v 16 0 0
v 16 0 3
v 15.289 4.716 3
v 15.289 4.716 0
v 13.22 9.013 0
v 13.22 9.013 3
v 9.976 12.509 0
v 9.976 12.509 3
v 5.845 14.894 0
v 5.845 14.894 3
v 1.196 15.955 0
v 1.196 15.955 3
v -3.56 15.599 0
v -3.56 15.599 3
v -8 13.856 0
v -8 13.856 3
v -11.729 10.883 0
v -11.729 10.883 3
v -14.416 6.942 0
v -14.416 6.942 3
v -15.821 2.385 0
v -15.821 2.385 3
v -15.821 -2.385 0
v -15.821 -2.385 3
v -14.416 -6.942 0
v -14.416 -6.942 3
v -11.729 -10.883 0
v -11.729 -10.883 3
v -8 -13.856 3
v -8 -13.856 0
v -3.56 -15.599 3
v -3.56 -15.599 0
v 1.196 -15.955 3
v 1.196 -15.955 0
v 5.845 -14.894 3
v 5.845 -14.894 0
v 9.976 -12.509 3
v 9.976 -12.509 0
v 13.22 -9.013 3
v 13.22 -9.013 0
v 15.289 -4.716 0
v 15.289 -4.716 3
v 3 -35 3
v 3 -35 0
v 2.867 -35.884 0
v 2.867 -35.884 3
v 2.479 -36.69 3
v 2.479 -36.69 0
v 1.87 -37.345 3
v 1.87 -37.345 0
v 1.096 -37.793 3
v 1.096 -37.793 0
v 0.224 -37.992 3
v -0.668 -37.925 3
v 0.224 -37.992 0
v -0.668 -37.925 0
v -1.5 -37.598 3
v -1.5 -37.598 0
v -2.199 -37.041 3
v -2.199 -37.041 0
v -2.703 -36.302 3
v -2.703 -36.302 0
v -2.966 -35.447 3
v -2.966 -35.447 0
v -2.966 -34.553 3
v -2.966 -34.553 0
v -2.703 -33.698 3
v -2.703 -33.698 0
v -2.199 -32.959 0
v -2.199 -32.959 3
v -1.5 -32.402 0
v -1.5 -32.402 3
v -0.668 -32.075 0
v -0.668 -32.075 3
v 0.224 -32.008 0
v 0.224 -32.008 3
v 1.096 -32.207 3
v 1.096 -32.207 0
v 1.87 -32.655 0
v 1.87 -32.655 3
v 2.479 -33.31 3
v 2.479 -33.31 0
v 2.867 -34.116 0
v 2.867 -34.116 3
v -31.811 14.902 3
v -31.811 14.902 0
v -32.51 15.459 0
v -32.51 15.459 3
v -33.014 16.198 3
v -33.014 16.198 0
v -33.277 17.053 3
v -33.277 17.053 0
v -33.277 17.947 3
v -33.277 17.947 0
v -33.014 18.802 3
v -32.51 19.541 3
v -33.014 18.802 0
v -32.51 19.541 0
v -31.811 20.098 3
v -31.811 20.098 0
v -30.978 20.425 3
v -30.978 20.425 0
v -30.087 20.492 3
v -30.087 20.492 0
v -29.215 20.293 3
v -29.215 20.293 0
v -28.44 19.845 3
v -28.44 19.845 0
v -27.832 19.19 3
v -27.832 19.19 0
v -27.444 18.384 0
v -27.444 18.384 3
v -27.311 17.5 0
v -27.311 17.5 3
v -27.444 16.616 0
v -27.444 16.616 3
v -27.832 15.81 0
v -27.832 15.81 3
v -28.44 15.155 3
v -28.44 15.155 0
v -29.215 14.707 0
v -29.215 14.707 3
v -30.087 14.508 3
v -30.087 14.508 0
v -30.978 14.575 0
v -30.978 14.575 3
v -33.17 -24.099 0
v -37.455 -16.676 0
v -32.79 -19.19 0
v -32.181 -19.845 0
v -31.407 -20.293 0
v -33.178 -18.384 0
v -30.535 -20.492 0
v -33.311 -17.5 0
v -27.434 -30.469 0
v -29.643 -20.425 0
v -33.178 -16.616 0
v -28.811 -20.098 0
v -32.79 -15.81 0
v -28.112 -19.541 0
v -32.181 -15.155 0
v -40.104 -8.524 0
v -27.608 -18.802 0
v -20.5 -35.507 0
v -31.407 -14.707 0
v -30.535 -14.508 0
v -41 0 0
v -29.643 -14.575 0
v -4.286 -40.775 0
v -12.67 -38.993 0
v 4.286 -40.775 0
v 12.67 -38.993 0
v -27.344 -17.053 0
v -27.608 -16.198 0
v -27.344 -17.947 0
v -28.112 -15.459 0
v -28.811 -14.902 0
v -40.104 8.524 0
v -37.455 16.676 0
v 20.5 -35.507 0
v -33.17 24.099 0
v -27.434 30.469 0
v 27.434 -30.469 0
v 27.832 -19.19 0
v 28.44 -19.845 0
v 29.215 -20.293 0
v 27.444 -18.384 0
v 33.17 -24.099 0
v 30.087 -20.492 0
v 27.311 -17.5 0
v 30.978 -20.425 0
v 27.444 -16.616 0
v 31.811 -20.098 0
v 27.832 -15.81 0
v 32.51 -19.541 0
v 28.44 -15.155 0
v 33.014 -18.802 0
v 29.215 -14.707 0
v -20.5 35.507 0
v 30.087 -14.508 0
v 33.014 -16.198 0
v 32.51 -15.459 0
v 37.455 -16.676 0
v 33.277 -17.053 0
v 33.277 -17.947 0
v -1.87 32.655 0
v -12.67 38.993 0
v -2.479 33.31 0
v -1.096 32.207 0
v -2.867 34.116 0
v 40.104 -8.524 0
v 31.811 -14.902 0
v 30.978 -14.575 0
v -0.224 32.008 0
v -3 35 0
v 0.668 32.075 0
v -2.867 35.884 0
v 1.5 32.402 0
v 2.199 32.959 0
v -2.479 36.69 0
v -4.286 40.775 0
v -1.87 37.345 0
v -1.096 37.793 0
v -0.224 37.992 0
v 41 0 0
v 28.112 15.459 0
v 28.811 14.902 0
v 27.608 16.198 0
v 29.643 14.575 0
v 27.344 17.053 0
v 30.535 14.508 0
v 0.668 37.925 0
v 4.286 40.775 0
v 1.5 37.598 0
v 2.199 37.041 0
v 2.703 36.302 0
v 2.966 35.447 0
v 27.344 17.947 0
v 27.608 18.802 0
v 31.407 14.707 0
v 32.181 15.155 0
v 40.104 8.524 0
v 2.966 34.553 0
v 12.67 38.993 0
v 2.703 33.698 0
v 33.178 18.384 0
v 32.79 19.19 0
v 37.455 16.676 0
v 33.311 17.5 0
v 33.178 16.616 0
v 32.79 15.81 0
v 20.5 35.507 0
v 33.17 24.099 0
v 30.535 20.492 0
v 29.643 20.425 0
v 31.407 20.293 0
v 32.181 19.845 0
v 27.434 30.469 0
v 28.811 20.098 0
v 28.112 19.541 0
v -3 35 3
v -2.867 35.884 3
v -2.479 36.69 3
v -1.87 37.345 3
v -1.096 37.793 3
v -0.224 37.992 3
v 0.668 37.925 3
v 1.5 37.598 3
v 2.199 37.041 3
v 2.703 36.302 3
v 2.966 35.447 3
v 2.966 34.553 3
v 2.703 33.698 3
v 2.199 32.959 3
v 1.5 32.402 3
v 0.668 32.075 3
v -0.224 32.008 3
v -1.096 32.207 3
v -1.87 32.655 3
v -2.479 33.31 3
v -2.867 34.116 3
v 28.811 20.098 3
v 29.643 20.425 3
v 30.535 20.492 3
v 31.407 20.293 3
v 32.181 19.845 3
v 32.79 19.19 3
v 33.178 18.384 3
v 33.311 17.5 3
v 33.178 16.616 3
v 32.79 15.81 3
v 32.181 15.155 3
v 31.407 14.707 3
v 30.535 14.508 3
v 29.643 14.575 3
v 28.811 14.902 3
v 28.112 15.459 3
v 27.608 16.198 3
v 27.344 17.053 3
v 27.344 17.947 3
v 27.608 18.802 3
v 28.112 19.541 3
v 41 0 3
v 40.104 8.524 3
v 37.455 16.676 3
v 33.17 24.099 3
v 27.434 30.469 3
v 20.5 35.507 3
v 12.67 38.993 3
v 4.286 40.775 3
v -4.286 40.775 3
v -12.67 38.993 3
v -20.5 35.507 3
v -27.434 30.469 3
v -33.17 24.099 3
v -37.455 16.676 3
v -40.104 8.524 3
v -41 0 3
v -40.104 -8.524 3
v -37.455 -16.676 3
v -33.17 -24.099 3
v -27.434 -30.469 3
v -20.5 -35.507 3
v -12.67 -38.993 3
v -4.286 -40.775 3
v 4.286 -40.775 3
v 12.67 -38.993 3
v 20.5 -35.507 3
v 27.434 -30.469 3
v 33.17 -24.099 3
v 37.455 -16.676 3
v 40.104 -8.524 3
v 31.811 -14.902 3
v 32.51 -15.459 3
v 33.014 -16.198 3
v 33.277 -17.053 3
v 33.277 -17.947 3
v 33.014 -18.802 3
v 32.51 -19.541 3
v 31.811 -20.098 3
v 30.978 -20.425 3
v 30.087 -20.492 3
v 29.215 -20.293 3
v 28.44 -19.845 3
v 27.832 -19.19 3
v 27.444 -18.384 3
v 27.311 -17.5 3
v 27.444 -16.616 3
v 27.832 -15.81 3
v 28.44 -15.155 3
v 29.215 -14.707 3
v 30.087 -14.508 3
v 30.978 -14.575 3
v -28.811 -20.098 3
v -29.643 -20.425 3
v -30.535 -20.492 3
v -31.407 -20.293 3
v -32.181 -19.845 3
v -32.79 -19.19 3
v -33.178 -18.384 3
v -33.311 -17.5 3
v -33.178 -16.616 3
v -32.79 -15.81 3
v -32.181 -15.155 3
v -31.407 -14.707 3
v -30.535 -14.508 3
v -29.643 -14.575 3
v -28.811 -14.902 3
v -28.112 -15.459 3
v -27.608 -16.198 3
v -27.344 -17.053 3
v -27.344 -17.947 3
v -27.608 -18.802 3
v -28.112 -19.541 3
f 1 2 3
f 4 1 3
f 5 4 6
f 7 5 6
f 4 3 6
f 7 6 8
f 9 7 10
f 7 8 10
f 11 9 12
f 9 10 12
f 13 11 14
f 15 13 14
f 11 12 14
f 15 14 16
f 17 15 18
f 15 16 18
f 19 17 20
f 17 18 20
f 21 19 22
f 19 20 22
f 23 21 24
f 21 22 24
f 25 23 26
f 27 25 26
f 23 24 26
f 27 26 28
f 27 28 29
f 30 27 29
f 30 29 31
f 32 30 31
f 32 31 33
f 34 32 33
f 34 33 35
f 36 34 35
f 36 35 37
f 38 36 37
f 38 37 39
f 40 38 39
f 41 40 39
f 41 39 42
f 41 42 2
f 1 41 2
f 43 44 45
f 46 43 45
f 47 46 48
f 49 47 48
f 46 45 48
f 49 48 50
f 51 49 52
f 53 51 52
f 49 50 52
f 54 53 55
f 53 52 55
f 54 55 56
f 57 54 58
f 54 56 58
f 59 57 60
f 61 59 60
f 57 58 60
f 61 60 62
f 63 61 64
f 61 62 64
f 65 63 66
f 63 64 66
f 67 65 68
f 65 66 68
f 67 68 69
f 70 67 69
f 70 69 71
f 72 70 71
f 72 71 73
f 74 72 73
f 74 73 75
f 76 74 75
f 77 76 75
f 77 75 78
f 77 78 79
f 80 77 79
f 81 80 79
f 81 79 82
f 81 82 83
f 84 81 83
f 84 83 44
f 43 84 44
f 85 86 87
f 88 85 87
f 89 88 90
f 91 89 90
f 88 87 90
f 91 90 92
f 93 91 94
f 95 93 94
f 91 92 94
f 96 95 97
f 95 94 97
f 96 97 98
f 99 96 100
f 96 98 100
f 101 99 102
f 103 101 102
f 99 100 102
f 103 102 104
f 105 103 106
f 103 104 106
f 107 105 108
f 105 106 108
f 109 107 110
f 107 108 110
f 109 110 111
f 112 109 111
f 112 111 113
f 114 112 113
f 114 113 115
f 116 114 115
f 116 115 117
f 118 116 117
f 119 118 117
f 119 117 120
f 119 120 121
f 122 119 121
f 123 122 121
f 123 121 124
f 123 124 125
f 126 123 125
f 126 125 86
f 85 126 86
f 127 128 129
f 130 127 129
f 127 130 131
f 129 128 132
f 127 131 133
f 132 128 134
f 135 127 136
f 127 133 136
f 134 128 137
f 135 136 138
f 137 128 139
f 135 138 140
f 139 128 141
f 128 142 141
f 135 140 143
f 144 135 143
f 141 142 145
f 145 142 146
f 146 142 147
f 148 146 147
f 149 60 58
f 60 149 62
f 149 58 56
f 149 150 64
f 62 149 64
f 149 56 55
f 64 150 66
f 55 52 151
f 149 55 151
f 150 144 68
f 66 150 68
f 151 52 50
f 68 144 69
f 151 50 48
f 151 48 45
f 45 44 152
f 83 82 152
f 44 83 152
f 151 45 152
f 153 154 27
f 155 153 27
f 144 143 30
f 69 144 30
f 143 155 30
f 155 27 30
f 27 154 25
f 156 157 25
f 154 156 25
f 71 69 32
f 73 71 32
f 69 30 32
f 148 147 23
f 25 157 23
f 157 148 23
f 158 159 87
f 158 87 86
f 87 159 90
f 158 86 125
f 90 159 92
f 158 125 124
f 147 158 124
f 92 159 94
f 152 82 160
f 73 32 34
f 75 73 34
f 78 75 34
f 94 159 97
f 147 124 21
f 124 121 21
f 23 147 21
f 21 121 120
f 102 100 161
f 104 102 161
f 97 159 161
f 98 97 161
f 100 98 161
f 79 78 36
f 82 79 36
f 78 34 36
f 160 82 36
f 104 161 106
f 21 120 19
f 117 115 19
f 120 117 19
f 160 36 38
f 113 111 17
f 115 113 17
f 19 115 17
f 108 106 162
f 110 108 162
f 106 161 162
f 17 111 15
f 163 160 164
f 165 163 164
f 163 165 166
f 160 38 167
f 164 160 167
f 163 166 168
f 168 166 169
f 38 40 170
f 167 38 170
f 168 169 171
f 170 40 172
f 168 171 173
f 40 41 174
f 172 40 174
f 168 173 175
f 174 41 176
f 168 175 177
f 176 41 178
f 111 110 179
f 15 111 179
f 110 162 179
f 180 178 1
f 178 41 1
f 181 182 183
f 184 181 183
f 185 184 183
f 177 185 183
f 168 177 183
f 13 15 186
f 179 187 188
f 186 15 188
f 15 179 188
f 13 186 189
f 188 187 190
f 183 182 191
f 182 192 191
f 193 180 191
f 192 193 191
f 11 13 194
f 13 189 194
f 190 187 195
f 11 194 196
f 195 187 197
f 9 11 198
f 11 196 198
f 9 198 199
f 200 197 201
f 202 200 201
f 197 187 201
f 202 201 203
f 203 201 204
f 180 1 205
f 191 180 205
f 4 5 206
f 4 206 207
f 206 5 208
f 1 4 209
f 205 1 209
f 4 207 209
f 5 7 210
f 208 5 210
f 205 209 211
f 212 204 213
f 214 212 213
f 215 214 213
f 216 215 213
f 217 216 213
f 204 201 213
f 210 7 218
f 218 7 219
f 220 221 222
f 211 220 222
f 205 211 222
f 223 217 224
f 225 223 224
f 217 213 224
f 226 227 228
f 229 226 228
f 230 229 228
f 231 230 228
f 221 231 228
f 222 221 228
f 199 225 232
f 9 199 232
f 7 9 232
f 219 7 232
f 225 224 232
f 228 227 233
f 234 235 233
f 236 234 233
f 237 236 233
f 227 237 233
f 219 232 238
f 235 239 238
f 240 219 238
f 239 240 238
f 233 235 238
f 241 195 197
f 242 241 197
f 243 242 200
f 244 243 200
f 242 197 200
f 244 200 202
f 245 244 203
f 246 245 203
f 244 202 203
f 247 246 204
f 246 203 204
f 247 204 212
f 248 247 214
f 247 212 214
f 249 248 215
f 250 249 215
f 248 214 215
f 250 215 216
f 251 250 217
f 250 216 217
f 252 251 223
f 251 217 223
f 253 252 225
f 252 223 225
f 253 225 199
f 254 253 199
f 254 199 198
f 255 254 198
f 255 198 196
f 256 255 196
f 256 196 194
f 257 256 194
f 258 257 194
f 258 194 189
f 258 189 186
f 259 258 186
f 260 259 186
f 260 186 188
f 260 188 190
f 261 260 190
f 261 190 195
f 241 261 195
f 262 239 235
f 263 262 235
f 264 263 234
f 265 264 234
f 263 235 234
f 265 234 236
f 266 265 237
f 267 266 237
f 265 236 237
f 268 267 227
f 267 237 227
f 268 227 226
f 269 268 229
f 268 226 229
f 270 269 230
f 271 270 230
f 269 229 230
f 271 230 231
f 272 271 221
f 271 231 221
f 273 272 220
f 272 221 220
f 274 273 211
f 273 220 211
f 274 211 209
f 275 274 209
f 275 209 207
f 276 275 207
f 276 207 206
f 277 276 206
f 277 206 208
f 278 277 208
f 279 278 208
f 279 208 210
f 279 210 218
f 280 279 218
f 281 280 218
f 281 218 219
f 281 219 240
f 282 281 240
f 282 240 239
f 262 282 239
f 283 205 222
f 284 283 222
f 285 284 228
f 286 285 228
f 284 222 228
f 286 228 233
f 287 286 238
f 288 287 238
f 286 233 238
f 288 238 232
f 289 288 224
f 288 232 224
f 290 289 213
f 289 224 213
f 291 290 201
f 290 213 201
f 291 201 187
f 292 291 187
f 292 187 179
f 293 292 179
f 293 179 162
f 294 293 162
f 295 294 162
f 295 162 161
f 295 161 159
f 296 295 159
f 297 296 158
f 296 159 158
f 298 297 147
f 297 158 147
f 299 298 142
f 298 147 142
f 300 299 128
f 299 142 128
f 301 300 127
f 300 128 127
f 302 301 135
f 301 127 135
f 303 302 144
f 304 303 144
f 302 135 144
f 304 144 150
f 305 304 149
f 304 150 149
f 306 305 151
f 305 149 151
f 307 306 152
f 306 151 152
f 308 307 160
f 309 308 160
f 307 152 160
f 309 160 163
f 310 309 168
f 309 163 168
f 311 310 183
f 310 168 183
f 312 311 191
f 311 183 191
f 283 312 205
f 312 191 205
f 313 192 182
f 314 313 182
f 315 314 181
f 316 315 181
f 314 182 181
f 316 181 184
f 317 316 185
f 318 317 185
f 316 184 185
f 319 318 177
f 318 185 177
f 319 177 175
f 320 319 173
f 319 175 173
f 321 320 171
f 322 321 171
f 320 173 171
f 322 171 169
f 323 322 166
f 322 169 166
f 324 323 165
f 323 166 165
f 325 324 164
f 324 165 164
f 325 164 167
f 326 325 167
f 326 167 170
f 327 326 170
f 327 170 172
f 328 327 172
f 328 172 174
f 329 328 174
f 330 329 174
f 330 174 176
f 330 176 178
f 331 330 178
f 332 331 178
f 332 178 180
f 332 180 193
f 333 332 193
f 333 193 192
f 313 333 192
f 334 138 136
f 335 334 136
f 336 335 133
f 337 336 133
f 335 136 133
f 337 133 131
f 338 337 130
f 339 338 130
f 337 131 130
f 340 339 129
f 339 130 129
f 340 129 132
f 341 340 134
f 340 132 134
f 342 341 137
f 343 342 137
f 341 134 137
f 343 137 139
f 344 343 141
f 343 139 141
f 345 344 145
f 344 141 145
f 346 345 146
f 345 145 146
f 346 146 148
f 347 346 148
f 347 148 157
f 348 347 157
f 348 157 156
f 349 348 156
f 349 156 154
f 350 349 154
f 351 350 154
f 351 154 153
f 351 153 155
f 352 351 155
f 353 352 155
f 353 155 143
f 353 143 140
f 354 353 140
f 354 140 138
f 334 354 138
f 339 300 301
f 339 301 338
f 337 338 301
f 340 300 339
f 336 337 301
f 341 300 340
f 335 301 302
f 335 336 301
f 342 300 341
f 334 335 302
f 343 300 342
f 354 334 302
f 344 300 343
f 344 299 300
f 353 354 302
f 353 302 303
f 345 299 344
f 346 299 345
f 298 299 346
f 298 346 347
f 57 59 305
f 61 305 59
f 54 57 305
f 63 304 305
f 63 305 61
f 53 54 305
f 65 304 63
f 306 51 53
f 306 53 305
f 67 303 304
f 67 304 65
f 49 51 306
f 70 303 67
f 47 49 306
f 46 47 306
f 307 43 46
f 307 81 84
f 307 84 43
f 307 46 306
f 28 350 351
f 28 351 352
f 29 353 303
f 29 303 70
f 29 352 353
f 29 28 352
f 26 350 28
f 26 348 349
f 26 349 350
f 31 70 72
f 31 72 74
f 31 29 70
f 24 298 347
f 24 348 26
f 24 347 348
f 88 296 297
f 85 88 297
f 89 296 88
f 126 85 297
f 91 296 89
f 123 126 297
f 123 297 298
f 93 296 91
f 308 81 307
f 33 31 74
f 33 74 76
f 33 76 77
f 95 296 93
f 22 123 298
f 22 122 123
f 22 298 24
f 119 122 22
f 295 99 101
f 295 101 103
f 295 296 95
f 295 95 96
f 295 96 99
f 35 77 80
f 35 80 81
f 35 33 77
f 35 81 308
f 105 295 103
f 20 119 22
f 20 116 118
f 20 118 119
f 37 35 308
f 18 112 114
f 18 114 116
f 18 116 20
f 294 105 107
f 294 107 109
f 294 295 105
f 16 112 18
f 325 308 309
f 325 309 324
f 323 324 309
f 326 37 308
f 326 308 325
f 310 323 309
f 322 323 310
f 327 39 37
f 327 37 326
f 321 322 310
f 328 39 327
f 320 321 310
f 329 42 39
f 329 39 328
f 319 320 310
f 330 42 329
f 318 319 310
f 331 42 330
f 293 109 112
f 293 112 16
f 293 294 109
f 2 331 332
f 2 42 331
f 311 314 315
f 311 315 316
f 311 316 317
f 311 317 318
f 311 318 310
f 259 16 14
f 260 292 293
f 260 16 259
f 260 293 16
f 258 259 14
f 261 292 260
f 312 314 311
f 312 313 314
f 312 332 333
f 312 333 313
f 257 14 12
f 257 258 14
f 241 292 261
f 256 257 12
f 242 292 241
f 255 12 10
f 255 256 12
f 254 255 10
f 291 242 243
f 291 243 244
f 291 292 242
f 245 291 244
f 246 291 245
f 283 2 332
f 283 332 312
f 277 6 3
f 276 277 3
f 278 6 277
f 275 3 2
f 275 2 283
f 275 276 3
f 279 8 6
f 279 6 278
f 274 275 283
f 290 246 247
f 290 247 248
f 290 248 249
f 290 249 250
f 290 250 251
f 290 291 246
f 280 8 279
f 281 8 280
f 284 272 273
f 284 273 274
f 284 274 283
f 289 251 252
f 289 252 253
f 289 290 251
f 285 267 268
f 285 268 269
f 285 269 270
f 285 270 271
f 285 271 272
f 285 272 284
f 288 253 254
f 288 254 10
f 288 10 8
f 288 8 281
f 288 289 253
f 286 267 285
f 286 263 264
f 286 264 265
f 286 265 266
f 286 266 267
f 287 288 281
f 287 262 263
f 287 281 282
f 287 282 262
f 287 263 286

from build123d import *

# Parameters (mm, degrees)
SKETCH1_R           = 41
BOSS_EXTRUDE1_DEPTH = 3
SKETCH3_R           = 3
CUT_EXTRUDE1_DEPTH  = 4
CIRPATTERN1_COUNT   = 6
CUT_EXTRUDE2_REACH  = 5
SKETCH4_R           = 16


with BuildPart() as part:
    # Sketch1 → Boss-Extrude1 (new body)
    with BuildSketch(Plane.XY):
        Circle(SKETCH1_R)
    extrude(amount=BOSS_EXTRUDE1_DEPTH)

    # Sketch3 → Cut-Extrude1 (cut, through all)
    with BuildSketch(Plane(origin=(0, 0, 0), x_dir=(-1, 0, 0), z_dir=(0, 0, -1))):
        with Locations((0, 35)):
            Circle(SKETCH3_R)
    cut_extrude1 = extrude(amount=-CUT_EXTRUDE1_DEPTH, mode=Mode.SUBTRACT)

    # CirPattern1: Cut-Extrude1 ×6 about axis
    cirpattern1_axis = Axis((0, 0, 0), (0, 0, 1))
    for i in range(1, CIRPATTERN1_COUNT):
        add(cut_extrude1.rotate(cirpattern1_axis, i * 360 / CIRPATTERN1_COUNT), mode=Mode.SUBTRACT)

    # Sketch4 → Cut-Extrude2 (cut, up to next)
    with BuildSketch(Plane.XY.offset(3), mode=Mode.PRIVATE) as cut_extrude2_sk1:
        Circle(SKETCH4_R)
    cut_extrude2_tool1 = extrude(cut_extrude2_sk1.sketch, amount=-CUT_EXTRUDE2_REACH, mode=Mode.PRIVATE) & part.part
    add(cut_extrude2_tool1.solids().sort_by_distance((0, 0, 3))[0], mode=Mode.SUBTRACT)


solid = part.part
